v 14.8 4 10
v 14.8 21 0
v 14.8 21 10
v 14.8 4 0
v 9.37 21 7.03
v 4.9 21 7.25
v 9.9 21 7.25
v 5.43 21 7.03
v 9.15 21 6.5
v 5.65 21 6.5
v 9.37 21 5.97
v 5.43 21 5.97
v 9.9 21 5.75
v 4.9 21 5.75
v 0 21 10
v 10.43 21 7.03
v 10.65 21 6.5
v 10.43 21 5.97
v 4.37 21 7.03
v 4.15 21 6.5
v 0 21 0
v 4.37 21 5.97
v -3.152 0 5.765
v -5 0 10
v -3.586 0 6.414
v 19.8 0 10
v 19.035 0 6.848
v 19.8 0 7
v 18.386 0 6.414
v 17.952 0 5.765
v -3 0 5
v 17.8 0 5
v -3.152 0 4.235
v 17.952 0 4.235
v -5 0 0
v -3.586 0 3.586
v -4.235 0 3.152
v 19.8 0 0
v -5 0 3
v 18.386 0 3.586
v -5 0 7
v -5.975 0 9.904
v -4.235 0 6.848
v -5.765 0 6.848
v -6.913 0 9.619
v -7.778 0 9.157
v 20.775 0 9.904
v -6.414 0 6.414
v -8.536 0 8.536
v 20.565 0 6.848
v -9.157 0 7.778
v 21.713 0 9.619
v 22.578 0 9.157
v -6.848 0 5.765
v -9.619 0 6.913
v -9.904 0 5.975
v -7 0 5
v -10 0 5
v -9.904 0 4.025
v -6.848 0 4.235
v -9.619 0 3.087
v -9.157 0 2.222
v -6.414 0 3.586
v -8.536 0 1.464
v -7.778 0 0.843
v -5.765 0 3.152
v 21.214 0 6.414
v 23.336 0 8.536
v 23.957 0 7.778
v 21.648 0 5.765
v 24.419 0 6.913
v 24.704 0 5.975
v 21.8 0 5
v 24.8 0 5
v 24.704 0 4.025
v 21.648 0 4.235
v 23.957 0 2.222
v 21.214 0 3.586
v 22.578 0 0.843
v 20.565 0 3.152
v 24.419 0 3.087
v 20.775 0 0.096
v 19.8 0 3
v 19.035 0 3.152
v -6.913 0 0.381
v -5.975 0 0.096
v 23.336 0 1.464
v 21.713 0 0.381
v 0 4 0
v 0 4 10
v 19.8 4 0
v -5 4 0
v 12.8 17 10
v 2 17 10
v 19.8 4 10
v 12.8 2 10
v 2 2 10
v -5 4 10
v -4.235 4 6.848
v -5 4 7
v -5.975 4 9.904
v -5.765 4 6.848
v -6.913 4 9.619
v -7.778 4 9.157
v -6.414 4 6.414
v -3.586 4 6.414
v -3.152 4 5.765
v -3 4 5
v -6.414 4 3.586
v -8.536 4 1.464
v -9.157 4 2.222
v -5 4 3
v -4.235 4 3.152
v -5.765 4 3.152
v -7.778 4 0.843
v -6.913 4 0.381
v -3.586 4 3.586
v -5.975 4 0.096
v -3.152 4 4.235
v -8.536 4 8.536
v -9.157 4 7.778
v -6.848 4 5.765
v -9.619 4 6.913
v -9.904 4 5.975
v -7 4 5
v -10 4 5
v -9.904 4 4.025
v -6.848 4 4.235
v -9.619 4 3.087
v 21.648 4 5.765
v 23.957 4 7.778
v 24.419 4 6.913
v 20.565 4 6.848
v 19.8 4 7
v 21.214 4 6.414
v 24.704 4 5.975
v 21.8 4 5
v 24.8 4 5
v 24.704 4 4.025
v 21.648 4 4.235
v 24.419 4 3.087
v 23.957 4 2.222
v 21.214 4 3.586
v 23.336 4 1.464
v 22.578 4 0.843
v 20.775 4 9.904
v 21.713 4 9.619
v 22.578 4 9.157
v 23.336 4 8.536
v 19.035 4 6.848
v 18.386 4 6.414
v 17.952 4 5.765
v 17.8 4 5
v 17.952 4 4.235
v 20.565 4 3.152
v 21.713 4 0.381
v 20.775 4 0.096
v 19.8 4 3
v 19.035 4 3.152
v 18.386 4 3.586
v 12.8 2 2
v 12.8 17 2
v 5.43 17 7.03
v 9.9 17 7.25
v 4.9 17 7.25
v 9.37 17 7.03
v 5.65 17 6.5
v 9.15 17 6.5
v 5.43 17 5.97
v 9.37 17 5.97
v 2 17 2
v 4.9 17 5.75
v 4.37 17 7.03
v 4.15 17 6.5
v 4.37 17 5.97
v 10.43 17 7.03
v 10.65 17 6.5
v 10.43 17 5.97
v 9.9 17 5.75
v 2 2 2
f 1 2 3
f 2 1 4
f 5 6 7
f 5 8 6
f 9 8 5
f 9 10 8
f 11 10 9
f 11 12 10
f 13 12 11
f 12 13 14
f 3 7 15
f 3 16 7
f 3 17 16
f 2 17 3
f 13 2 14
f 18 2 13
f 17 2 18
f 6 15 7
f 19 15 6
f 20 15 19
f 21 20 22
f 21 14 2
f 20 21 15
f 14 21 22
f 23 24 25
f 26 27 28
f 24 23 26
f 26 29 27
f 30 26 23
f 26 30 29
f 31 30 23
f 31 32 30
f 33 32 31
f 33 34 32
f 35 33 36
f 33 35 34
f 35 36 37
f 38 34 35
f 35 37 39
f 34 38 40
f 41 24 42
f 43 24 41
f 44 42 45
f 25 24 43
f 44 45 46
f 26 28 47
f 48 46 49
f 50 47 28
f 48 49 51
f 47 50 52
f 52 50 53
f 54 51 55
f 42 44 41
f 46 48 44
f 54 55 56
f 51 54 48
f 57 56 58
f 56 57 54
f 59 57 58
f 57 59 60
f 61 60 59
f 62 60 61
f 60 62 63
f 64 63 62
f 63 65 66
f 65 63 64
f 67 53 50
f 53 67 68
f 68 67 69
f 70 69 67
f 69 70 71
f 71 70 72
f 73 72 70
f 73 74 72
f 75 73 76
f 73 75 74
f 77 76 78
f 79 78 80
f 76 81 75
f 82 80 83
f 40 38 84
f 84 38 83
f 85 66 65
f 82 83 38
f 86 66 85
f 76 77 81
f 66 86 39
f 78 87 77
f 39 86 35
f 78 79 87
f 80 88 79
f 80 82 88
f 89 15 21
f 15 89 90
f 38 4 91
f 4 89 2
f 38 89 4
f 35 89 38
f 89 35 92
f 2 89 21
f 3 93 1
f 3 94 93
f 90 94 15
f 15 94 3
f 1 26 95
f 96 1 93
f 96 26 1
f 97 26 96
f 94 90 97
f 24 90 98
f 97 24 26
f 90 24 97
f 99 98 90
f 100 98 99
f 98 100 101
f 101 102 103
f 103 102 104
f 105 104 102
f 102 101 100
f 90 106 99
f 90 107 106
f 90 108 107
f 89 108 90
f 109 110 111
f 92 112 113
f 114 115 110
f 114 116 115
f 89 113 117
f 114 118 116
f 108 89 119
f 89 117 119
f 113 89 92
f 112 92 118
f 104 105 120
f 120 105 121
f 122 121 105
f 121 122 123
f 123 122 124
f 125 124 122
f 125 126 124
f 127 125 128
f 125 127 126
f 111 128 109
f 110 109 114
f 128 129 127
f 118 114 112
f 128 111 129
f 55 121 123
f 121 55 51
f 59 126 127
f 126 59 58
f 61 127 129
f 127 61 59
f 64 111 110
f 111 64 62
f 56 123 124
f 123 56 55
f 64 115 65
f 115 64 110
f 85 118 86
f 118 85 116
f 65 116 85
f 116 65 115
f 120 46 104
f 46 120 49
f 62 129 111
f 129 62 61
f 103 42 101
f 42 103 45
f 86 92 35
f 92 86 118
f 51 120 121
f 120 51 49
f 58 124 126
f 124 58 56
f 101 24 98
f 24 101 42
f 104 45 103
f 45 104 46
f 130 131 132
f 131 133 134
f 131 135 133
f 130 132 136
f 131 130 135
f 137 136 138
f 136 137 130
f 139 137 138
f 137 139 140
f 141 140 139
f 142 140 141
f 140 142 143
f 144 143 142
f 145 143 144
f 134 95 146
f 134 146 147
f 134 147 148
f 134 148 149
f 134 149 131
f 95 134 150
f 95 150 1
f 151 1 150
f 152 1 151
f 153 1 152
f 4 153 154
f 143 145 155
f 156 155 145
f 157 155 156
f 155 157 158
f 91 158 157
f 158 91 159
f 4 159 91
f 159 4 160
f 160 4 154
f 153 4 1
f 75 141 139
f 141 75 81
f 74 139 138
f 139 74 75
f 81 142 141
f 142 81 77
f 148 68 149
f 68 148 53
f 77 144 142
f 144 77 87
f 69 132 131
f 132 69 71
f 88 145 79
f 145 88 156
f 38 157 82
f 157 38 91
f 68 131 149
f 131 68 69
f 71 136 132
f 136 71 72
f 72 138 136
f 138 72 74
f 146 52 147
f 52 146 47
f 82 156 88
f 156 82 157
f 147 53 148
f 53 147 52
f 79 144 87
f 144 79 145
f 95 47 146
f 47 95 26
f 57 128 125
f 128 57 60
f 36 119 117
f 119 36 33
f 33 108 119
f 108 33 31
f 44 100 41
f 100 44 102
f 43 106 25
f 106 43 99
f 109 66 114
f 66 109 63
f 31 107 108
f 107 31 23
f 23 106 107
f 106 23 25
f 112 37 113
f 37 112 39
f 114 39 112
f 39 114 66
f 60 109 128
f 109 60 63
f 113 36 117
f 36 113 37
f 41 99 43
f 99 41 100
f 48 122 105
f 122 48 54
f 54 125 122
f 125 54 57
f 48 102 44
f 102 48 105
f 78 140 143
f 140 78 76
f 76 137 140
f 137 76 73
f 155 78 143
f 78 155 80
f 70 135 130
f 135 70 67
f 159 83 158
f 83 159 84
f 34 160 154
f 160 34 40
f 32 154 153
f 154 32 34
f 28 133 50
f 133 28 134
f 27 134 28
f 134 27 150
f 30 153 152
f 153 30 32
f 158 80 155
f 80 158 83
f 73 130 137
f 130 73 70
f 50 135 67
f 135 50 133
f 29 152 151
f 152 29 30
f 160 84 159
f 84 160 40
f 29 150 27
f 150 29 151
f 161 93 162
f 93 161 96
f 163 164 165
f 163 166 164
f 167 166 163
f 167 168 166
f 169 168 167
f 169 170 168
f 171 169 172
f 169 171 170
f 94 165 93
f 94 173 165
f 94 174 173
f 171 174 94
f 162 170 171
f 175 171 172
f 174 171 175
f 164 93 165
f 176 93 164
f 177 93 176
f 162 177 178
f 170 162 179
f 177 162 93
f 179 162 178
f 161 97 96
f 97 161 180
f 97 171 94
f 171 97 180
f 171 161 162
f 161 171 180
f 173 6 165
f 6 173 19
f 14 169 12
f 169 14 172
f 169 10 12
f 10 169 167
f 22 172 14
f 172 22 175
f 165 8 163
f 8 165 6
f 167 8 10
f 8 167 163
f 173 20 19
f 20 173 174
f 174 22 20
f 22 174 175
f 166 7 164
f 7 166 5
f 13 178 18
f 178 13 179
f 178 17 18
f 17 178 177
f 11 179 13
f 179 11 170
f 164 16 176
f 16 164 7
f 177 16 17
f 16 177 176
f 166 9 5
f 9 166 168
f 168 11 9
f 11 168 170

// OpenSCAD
feetDiameter=1.5;
feetDistance=5;
feetHeight=4;
feetWidthOffset=3.5;

holderLength=10+0.8;
holderWidth=8;
holderHeight=10;
baseThickness=2;
wallThickness=2;

holeHeight=holderHeight+feetHeight+1;
cubeLength=holderLength+2*wallThickness;
cubeHeight=baseThickness+holeHeight+feetHeight;

screwDiameter=4;
screwHolderDiameter=10;
screwHolderRadius=screwHolderDiameter/2;
screwHolderThickness=4;

translate([0,0,screwHolderDiameter])
rotate([-90,0,0])
difference()
{
	union()
	{
		cube([cubeLength,screwHolderDiameter,cubeHeight]);
		
		translate([-screwHolderRadius,0,0])
		cube([screwHolderRadius,screwHolderDiameter,screwHolderThickness]);
		
		translate([-screwHolderRadius,screwHolderRadius,0])
		cylinder(d=screwHolderDiameter,h=screwHolderThickness,$fn=32);
		
		translate([cubeLength,0,0])
		cube([screwHolderRadius,screwHolderDiameter,screwHolderThickness]);
		
		translate([cubeLength+screwHolderRadius,screwHolderRadius,0])
		cylinder(d=screwHolderDiameter,h=screwHolderThickness,$fn=32);
	}
	
	// Screw holes
	translate([-screwHolderRadius,screwHolderRadius,-1])
	cylinder(d=screwDiameter,h=screwHolderThickness+2,$fn=16);
	
	translate([cubeLength+screwHolderRadius,screwHolderRadius,-1])
	cylinder(d=screwDiameter,h=screwHolderThickness+2,$fn=16);
	
	// Hole
	translate([wallThickness,-1,baseThickness])
	cube([holderLength,holderWidth+1,holeHeight]);
	
	// Feet
	translate([cubeLength/2-feetDistance/2,feetWidthOffset,baseThickness+holeHeight-1])
	cylinder(d=feetDiameter,h=feetHeight+2,$fn=8);
	
	translate([cubeLength/2+feetDistance/2,feetWidthOffset,baseThickness+holeHeight-1])
	cylinder(d=feetDiameter,h=feetHeight+2,$fn=8);
}
